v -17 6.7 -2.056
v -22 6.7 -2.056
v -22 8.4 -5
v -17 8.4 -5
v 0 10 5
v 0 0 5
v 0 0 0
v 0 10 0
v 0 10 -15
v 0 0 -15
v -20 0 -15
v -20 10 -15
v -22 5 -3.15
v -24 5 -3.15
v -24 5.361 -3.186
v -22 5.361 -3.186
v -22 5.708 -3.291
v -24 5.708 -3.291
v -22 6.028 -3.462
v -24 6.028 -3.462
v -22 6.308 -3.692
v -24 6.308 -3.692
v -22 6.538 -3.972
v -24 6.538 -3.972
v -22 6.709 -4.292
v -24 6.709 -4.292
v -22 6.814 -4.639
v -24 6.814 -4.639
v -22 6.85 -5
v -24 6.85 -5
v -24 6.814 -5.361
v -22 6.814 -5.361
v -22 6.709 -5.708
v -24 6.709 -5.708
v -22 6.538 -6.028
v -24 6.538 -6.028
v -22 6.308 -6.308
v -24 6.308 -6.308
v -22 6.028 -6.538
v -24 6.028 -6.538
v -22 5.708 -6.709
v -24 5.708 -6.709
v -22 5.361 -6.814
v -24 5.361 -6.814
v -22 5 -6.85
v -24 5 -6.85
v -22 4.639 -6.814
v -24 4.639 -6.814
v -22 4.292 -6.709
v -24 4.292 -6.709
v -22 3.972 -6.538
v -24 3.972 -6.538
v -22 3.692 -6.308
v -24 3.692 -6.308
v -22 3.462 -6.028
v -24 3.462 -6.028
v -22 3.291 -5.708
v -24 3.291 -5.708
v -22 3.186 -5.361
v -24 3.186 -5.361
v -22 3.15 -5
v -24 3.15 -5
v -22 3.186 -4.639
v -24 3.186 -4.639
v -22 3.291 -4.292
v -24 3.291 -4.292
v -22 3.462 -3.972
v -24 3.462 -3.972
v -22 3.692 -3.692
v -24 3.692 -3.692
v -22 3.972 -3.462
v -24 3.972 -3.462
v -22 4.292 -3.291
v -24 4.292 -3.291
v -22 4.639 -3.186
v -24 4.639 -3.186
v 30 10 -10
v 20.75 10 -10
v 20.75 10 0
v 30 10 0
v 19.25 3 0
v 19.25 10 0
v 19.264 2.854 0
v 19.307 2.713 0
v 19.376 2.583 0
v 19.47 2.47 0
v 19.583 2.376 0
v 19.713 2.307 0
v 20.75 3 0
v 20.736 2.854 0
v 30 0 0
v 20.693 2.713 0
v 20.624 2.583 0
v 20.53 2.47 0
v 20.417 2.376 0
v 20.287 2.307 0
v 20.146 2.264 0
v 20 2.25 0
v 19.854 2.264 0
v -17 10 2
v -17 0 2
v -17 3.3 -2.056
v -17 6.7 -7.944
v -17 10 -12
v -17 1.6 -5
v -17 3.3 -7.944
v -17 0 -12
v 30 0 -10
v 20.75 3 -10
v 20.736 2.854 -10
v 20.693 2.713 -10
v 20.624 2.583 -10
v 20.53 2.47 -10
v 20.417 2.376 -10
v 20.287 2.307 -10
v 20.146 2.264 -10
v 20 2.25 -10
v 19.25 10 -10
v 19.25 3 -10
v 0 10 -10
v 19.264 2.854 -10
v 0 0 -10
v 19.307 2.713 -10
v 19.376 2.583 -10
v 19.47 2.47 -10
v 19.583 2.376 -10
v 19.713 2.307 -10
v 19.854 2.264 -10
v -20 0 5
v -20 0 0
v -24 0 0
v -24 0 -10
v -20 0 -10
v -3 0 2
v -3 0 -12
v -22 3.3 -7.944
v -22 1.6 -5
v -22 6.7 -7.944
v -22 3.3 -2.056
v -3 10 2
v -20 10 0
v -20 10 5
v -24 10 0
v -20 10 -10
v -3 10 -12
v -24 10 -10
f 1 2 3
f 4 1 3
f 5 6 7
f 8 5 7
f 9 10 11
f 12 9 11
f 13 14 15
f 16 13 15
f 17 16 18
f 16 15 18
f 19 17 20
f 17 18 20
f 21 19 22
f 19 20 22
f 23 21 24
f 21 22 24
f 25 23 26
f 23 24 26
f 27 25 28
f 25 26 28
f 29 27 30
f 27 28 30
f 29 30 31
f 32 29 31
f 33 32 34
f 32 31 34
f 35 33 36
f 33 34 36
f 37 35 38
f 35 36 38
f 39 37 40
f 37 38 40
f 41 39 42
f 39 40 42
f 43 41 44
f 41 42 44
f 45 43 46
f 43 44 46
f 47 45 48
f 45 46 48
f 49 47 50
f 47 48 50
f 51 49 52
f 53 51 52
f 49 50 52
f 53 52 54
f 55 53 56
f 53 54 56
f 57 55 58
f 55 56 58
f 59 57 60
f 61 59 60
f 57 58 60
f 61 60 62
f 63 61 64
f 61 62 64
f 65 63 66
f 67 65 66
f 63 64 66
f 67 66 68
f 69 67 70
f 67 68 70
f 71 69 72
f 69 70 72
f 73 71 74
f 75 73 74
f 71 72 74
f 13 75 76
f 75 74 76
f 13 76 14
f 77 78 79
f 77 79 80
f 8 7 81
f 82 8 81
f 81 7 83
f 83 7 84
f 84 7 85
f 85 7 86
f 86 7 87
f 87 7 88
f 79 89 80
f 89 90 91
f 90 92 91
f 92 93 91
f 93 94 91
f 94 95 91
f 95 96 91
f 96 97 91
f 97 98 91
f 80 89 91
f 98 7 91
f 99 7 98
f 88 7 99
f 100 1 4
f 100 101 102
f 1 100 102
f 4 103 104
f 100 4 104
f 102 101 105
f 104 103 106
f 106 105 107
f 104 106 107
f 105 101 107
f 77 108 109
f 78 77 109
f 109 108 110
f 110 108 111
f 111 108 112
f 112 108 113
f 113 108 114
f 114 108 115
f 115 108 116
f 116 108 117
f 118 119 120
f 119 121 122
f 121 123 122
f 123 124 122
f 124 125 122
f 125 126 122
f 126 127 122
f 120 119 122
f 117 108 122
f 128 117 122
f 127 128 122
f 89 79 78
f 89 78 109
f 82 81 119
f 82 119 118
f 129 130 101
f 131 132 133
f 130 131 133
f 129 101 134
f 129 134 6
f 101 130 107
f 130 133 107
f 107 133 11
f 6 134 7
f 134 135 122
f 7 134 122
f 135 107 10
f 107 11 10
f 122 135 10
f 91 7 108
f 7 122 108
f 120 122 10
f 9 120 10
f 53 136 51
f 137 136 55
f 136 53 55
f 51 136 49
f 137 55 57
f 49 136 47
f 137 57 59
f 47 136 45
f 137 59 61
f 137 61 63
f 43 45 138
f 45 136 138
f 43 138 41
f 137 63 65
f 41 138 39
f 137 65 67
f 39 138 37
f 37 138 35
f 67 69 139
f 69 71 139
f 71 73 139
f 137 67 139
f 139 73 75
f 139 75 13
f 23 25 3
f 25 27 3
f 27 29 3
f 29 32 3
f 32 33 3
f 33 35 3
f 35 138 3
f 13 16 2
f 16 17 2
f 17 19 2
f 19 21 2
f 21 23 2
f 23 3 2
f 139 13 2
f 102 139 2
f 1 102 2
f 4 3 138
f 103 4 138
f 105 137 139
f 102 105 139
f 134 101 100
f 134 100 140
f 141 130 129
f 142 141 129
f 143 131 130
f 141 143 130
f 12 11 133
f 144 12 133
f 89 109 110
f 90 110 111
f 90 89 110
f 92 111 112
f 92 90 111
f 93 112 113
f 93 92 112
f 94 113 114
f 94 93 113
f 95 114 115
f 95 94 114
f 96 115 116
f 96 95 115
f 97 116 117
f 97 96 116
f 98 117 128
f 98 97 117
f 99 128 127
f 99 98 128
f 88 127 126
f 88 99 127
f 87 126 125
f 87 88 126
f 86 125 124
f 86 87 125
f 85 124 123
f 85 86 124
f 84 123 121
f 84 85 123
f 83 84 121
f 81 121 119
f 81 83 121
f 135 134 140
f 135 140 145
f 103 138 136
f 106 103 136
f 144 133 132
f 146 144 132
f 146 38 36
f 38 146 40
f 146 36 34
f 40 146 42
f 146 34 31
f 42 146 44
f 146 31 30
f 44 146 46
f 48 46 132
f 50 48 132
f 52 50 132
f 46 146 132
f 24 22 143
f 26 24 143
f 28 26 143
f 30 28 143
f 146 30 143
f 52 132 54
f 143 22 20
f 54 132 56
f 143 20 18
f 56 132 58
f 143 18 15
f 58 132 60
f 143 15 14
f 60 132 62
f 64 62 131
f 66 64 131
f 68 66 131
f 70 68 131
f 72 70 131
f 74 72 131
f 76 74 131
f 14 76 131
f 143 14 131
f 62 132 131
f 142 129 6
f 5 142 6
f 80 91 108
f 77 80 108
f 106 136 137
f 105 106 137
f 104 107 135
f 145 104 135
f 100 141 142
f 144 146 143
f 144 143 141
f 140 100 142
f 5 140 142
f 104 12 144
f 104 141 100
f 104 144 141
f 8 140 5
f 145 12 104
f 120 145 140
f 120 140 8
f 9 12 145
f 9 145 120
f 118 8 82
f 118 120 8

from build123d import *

# Parameters (mm, degrees)
SKETCH1_W           = 14
SKETCH1_H           = 14
BOSS_EXTRUDE1_DEPTH = 10
CUT_EXTRUDE1_REACH  = 37
SKETCH4_R           = 1.85
CUT_EXTRUDE2_DEPTH  = 2
CUT_EXTRUDE3_REACH  = 57.036


with BuildPart() as part:
    # Sketch1 → Boss-Extrude1 (new body)
    with BuildSketch(Plane(origin=(0, 0, 0), x_dir=(1, 0, 0), z_dir=(0, 1, 0))):
        Polygon((0, 0), (30, 0), (30, 10), (0, 10), (0, 15), (-20, 15), (-20, 10), (-24, 10), (-24, 0), (-20, 0), (-20, -5), (0, -5), align=None)
        with Locations((-10, 5)):
            Rectangle(SKETCH1_W, SKETCH1_H, mode=Mode.SUBTRACT)
    extrude(amount=BOSS_EXTRUDE1_DEPTH)

    # Sketch3 → Cut-Extrude1 (cut, up to next)
    with BuildSketch(Plane.XY, mode=Mode.PRIVATE) as cut_extrude1_sk1:
        with BuildLine():
            Line((19.25, 10), (20.75, 10))
            Line((20.75, 10), (20.75, 3))
            ThreePointArc((20.75, 3), (20, 2.25), (19.25, 3))
            Line((19.25, 3), (19.25, 10))
        make_face()
    cut_extrude1_tool1 = extrude(cut_extrude1_sk1.sketch, amount=-CUT_EXTRUDE1_REACH, mode=Mode.PRIVATE) & part.part
    add(cut_extrude1_tool1.solids().sort_by_distance((20, 6.203629, 0))[0], mode=Mode.SUBTRACT)

    # Sketch4 → Cut-Extrude2 (cut)
    with BuildSketch(Plane.ZY.offset(24)):
        with Locations((-5, 5)):
            Circle(SKETCH4_R)
    extrude(amount=-CUT_EXTRUDE2_DEPTH, mode=Mode.SUBTRACT)

    # Sketch5 → Cut-Extrude3 (cut, up to next)
    with BuildSketch(Plane.ZY.offset(22), mode=Mode.PRIVATE) as cut_extrude3_sk1:
        Polygon((-5, 8.4), (-7.944486373, 6.7), (-7.944486373, 3.3), (-5, 1.6), (-2.055513627, 3.3), (-2.055513627, 6.7), align=None)
    cut_extrude3_tool1 = extrude(cut_extrude3_sk1.sketch, amount=-CUT_EXTRUDE3_REACH, mode=Mode.PRIVATE) & part.part
    add(cut_extrude3_tool1.solids().sort_by_distance((-22, 5, -5))[0], mode=Mode.SUBTRACT)


solid = part.part
